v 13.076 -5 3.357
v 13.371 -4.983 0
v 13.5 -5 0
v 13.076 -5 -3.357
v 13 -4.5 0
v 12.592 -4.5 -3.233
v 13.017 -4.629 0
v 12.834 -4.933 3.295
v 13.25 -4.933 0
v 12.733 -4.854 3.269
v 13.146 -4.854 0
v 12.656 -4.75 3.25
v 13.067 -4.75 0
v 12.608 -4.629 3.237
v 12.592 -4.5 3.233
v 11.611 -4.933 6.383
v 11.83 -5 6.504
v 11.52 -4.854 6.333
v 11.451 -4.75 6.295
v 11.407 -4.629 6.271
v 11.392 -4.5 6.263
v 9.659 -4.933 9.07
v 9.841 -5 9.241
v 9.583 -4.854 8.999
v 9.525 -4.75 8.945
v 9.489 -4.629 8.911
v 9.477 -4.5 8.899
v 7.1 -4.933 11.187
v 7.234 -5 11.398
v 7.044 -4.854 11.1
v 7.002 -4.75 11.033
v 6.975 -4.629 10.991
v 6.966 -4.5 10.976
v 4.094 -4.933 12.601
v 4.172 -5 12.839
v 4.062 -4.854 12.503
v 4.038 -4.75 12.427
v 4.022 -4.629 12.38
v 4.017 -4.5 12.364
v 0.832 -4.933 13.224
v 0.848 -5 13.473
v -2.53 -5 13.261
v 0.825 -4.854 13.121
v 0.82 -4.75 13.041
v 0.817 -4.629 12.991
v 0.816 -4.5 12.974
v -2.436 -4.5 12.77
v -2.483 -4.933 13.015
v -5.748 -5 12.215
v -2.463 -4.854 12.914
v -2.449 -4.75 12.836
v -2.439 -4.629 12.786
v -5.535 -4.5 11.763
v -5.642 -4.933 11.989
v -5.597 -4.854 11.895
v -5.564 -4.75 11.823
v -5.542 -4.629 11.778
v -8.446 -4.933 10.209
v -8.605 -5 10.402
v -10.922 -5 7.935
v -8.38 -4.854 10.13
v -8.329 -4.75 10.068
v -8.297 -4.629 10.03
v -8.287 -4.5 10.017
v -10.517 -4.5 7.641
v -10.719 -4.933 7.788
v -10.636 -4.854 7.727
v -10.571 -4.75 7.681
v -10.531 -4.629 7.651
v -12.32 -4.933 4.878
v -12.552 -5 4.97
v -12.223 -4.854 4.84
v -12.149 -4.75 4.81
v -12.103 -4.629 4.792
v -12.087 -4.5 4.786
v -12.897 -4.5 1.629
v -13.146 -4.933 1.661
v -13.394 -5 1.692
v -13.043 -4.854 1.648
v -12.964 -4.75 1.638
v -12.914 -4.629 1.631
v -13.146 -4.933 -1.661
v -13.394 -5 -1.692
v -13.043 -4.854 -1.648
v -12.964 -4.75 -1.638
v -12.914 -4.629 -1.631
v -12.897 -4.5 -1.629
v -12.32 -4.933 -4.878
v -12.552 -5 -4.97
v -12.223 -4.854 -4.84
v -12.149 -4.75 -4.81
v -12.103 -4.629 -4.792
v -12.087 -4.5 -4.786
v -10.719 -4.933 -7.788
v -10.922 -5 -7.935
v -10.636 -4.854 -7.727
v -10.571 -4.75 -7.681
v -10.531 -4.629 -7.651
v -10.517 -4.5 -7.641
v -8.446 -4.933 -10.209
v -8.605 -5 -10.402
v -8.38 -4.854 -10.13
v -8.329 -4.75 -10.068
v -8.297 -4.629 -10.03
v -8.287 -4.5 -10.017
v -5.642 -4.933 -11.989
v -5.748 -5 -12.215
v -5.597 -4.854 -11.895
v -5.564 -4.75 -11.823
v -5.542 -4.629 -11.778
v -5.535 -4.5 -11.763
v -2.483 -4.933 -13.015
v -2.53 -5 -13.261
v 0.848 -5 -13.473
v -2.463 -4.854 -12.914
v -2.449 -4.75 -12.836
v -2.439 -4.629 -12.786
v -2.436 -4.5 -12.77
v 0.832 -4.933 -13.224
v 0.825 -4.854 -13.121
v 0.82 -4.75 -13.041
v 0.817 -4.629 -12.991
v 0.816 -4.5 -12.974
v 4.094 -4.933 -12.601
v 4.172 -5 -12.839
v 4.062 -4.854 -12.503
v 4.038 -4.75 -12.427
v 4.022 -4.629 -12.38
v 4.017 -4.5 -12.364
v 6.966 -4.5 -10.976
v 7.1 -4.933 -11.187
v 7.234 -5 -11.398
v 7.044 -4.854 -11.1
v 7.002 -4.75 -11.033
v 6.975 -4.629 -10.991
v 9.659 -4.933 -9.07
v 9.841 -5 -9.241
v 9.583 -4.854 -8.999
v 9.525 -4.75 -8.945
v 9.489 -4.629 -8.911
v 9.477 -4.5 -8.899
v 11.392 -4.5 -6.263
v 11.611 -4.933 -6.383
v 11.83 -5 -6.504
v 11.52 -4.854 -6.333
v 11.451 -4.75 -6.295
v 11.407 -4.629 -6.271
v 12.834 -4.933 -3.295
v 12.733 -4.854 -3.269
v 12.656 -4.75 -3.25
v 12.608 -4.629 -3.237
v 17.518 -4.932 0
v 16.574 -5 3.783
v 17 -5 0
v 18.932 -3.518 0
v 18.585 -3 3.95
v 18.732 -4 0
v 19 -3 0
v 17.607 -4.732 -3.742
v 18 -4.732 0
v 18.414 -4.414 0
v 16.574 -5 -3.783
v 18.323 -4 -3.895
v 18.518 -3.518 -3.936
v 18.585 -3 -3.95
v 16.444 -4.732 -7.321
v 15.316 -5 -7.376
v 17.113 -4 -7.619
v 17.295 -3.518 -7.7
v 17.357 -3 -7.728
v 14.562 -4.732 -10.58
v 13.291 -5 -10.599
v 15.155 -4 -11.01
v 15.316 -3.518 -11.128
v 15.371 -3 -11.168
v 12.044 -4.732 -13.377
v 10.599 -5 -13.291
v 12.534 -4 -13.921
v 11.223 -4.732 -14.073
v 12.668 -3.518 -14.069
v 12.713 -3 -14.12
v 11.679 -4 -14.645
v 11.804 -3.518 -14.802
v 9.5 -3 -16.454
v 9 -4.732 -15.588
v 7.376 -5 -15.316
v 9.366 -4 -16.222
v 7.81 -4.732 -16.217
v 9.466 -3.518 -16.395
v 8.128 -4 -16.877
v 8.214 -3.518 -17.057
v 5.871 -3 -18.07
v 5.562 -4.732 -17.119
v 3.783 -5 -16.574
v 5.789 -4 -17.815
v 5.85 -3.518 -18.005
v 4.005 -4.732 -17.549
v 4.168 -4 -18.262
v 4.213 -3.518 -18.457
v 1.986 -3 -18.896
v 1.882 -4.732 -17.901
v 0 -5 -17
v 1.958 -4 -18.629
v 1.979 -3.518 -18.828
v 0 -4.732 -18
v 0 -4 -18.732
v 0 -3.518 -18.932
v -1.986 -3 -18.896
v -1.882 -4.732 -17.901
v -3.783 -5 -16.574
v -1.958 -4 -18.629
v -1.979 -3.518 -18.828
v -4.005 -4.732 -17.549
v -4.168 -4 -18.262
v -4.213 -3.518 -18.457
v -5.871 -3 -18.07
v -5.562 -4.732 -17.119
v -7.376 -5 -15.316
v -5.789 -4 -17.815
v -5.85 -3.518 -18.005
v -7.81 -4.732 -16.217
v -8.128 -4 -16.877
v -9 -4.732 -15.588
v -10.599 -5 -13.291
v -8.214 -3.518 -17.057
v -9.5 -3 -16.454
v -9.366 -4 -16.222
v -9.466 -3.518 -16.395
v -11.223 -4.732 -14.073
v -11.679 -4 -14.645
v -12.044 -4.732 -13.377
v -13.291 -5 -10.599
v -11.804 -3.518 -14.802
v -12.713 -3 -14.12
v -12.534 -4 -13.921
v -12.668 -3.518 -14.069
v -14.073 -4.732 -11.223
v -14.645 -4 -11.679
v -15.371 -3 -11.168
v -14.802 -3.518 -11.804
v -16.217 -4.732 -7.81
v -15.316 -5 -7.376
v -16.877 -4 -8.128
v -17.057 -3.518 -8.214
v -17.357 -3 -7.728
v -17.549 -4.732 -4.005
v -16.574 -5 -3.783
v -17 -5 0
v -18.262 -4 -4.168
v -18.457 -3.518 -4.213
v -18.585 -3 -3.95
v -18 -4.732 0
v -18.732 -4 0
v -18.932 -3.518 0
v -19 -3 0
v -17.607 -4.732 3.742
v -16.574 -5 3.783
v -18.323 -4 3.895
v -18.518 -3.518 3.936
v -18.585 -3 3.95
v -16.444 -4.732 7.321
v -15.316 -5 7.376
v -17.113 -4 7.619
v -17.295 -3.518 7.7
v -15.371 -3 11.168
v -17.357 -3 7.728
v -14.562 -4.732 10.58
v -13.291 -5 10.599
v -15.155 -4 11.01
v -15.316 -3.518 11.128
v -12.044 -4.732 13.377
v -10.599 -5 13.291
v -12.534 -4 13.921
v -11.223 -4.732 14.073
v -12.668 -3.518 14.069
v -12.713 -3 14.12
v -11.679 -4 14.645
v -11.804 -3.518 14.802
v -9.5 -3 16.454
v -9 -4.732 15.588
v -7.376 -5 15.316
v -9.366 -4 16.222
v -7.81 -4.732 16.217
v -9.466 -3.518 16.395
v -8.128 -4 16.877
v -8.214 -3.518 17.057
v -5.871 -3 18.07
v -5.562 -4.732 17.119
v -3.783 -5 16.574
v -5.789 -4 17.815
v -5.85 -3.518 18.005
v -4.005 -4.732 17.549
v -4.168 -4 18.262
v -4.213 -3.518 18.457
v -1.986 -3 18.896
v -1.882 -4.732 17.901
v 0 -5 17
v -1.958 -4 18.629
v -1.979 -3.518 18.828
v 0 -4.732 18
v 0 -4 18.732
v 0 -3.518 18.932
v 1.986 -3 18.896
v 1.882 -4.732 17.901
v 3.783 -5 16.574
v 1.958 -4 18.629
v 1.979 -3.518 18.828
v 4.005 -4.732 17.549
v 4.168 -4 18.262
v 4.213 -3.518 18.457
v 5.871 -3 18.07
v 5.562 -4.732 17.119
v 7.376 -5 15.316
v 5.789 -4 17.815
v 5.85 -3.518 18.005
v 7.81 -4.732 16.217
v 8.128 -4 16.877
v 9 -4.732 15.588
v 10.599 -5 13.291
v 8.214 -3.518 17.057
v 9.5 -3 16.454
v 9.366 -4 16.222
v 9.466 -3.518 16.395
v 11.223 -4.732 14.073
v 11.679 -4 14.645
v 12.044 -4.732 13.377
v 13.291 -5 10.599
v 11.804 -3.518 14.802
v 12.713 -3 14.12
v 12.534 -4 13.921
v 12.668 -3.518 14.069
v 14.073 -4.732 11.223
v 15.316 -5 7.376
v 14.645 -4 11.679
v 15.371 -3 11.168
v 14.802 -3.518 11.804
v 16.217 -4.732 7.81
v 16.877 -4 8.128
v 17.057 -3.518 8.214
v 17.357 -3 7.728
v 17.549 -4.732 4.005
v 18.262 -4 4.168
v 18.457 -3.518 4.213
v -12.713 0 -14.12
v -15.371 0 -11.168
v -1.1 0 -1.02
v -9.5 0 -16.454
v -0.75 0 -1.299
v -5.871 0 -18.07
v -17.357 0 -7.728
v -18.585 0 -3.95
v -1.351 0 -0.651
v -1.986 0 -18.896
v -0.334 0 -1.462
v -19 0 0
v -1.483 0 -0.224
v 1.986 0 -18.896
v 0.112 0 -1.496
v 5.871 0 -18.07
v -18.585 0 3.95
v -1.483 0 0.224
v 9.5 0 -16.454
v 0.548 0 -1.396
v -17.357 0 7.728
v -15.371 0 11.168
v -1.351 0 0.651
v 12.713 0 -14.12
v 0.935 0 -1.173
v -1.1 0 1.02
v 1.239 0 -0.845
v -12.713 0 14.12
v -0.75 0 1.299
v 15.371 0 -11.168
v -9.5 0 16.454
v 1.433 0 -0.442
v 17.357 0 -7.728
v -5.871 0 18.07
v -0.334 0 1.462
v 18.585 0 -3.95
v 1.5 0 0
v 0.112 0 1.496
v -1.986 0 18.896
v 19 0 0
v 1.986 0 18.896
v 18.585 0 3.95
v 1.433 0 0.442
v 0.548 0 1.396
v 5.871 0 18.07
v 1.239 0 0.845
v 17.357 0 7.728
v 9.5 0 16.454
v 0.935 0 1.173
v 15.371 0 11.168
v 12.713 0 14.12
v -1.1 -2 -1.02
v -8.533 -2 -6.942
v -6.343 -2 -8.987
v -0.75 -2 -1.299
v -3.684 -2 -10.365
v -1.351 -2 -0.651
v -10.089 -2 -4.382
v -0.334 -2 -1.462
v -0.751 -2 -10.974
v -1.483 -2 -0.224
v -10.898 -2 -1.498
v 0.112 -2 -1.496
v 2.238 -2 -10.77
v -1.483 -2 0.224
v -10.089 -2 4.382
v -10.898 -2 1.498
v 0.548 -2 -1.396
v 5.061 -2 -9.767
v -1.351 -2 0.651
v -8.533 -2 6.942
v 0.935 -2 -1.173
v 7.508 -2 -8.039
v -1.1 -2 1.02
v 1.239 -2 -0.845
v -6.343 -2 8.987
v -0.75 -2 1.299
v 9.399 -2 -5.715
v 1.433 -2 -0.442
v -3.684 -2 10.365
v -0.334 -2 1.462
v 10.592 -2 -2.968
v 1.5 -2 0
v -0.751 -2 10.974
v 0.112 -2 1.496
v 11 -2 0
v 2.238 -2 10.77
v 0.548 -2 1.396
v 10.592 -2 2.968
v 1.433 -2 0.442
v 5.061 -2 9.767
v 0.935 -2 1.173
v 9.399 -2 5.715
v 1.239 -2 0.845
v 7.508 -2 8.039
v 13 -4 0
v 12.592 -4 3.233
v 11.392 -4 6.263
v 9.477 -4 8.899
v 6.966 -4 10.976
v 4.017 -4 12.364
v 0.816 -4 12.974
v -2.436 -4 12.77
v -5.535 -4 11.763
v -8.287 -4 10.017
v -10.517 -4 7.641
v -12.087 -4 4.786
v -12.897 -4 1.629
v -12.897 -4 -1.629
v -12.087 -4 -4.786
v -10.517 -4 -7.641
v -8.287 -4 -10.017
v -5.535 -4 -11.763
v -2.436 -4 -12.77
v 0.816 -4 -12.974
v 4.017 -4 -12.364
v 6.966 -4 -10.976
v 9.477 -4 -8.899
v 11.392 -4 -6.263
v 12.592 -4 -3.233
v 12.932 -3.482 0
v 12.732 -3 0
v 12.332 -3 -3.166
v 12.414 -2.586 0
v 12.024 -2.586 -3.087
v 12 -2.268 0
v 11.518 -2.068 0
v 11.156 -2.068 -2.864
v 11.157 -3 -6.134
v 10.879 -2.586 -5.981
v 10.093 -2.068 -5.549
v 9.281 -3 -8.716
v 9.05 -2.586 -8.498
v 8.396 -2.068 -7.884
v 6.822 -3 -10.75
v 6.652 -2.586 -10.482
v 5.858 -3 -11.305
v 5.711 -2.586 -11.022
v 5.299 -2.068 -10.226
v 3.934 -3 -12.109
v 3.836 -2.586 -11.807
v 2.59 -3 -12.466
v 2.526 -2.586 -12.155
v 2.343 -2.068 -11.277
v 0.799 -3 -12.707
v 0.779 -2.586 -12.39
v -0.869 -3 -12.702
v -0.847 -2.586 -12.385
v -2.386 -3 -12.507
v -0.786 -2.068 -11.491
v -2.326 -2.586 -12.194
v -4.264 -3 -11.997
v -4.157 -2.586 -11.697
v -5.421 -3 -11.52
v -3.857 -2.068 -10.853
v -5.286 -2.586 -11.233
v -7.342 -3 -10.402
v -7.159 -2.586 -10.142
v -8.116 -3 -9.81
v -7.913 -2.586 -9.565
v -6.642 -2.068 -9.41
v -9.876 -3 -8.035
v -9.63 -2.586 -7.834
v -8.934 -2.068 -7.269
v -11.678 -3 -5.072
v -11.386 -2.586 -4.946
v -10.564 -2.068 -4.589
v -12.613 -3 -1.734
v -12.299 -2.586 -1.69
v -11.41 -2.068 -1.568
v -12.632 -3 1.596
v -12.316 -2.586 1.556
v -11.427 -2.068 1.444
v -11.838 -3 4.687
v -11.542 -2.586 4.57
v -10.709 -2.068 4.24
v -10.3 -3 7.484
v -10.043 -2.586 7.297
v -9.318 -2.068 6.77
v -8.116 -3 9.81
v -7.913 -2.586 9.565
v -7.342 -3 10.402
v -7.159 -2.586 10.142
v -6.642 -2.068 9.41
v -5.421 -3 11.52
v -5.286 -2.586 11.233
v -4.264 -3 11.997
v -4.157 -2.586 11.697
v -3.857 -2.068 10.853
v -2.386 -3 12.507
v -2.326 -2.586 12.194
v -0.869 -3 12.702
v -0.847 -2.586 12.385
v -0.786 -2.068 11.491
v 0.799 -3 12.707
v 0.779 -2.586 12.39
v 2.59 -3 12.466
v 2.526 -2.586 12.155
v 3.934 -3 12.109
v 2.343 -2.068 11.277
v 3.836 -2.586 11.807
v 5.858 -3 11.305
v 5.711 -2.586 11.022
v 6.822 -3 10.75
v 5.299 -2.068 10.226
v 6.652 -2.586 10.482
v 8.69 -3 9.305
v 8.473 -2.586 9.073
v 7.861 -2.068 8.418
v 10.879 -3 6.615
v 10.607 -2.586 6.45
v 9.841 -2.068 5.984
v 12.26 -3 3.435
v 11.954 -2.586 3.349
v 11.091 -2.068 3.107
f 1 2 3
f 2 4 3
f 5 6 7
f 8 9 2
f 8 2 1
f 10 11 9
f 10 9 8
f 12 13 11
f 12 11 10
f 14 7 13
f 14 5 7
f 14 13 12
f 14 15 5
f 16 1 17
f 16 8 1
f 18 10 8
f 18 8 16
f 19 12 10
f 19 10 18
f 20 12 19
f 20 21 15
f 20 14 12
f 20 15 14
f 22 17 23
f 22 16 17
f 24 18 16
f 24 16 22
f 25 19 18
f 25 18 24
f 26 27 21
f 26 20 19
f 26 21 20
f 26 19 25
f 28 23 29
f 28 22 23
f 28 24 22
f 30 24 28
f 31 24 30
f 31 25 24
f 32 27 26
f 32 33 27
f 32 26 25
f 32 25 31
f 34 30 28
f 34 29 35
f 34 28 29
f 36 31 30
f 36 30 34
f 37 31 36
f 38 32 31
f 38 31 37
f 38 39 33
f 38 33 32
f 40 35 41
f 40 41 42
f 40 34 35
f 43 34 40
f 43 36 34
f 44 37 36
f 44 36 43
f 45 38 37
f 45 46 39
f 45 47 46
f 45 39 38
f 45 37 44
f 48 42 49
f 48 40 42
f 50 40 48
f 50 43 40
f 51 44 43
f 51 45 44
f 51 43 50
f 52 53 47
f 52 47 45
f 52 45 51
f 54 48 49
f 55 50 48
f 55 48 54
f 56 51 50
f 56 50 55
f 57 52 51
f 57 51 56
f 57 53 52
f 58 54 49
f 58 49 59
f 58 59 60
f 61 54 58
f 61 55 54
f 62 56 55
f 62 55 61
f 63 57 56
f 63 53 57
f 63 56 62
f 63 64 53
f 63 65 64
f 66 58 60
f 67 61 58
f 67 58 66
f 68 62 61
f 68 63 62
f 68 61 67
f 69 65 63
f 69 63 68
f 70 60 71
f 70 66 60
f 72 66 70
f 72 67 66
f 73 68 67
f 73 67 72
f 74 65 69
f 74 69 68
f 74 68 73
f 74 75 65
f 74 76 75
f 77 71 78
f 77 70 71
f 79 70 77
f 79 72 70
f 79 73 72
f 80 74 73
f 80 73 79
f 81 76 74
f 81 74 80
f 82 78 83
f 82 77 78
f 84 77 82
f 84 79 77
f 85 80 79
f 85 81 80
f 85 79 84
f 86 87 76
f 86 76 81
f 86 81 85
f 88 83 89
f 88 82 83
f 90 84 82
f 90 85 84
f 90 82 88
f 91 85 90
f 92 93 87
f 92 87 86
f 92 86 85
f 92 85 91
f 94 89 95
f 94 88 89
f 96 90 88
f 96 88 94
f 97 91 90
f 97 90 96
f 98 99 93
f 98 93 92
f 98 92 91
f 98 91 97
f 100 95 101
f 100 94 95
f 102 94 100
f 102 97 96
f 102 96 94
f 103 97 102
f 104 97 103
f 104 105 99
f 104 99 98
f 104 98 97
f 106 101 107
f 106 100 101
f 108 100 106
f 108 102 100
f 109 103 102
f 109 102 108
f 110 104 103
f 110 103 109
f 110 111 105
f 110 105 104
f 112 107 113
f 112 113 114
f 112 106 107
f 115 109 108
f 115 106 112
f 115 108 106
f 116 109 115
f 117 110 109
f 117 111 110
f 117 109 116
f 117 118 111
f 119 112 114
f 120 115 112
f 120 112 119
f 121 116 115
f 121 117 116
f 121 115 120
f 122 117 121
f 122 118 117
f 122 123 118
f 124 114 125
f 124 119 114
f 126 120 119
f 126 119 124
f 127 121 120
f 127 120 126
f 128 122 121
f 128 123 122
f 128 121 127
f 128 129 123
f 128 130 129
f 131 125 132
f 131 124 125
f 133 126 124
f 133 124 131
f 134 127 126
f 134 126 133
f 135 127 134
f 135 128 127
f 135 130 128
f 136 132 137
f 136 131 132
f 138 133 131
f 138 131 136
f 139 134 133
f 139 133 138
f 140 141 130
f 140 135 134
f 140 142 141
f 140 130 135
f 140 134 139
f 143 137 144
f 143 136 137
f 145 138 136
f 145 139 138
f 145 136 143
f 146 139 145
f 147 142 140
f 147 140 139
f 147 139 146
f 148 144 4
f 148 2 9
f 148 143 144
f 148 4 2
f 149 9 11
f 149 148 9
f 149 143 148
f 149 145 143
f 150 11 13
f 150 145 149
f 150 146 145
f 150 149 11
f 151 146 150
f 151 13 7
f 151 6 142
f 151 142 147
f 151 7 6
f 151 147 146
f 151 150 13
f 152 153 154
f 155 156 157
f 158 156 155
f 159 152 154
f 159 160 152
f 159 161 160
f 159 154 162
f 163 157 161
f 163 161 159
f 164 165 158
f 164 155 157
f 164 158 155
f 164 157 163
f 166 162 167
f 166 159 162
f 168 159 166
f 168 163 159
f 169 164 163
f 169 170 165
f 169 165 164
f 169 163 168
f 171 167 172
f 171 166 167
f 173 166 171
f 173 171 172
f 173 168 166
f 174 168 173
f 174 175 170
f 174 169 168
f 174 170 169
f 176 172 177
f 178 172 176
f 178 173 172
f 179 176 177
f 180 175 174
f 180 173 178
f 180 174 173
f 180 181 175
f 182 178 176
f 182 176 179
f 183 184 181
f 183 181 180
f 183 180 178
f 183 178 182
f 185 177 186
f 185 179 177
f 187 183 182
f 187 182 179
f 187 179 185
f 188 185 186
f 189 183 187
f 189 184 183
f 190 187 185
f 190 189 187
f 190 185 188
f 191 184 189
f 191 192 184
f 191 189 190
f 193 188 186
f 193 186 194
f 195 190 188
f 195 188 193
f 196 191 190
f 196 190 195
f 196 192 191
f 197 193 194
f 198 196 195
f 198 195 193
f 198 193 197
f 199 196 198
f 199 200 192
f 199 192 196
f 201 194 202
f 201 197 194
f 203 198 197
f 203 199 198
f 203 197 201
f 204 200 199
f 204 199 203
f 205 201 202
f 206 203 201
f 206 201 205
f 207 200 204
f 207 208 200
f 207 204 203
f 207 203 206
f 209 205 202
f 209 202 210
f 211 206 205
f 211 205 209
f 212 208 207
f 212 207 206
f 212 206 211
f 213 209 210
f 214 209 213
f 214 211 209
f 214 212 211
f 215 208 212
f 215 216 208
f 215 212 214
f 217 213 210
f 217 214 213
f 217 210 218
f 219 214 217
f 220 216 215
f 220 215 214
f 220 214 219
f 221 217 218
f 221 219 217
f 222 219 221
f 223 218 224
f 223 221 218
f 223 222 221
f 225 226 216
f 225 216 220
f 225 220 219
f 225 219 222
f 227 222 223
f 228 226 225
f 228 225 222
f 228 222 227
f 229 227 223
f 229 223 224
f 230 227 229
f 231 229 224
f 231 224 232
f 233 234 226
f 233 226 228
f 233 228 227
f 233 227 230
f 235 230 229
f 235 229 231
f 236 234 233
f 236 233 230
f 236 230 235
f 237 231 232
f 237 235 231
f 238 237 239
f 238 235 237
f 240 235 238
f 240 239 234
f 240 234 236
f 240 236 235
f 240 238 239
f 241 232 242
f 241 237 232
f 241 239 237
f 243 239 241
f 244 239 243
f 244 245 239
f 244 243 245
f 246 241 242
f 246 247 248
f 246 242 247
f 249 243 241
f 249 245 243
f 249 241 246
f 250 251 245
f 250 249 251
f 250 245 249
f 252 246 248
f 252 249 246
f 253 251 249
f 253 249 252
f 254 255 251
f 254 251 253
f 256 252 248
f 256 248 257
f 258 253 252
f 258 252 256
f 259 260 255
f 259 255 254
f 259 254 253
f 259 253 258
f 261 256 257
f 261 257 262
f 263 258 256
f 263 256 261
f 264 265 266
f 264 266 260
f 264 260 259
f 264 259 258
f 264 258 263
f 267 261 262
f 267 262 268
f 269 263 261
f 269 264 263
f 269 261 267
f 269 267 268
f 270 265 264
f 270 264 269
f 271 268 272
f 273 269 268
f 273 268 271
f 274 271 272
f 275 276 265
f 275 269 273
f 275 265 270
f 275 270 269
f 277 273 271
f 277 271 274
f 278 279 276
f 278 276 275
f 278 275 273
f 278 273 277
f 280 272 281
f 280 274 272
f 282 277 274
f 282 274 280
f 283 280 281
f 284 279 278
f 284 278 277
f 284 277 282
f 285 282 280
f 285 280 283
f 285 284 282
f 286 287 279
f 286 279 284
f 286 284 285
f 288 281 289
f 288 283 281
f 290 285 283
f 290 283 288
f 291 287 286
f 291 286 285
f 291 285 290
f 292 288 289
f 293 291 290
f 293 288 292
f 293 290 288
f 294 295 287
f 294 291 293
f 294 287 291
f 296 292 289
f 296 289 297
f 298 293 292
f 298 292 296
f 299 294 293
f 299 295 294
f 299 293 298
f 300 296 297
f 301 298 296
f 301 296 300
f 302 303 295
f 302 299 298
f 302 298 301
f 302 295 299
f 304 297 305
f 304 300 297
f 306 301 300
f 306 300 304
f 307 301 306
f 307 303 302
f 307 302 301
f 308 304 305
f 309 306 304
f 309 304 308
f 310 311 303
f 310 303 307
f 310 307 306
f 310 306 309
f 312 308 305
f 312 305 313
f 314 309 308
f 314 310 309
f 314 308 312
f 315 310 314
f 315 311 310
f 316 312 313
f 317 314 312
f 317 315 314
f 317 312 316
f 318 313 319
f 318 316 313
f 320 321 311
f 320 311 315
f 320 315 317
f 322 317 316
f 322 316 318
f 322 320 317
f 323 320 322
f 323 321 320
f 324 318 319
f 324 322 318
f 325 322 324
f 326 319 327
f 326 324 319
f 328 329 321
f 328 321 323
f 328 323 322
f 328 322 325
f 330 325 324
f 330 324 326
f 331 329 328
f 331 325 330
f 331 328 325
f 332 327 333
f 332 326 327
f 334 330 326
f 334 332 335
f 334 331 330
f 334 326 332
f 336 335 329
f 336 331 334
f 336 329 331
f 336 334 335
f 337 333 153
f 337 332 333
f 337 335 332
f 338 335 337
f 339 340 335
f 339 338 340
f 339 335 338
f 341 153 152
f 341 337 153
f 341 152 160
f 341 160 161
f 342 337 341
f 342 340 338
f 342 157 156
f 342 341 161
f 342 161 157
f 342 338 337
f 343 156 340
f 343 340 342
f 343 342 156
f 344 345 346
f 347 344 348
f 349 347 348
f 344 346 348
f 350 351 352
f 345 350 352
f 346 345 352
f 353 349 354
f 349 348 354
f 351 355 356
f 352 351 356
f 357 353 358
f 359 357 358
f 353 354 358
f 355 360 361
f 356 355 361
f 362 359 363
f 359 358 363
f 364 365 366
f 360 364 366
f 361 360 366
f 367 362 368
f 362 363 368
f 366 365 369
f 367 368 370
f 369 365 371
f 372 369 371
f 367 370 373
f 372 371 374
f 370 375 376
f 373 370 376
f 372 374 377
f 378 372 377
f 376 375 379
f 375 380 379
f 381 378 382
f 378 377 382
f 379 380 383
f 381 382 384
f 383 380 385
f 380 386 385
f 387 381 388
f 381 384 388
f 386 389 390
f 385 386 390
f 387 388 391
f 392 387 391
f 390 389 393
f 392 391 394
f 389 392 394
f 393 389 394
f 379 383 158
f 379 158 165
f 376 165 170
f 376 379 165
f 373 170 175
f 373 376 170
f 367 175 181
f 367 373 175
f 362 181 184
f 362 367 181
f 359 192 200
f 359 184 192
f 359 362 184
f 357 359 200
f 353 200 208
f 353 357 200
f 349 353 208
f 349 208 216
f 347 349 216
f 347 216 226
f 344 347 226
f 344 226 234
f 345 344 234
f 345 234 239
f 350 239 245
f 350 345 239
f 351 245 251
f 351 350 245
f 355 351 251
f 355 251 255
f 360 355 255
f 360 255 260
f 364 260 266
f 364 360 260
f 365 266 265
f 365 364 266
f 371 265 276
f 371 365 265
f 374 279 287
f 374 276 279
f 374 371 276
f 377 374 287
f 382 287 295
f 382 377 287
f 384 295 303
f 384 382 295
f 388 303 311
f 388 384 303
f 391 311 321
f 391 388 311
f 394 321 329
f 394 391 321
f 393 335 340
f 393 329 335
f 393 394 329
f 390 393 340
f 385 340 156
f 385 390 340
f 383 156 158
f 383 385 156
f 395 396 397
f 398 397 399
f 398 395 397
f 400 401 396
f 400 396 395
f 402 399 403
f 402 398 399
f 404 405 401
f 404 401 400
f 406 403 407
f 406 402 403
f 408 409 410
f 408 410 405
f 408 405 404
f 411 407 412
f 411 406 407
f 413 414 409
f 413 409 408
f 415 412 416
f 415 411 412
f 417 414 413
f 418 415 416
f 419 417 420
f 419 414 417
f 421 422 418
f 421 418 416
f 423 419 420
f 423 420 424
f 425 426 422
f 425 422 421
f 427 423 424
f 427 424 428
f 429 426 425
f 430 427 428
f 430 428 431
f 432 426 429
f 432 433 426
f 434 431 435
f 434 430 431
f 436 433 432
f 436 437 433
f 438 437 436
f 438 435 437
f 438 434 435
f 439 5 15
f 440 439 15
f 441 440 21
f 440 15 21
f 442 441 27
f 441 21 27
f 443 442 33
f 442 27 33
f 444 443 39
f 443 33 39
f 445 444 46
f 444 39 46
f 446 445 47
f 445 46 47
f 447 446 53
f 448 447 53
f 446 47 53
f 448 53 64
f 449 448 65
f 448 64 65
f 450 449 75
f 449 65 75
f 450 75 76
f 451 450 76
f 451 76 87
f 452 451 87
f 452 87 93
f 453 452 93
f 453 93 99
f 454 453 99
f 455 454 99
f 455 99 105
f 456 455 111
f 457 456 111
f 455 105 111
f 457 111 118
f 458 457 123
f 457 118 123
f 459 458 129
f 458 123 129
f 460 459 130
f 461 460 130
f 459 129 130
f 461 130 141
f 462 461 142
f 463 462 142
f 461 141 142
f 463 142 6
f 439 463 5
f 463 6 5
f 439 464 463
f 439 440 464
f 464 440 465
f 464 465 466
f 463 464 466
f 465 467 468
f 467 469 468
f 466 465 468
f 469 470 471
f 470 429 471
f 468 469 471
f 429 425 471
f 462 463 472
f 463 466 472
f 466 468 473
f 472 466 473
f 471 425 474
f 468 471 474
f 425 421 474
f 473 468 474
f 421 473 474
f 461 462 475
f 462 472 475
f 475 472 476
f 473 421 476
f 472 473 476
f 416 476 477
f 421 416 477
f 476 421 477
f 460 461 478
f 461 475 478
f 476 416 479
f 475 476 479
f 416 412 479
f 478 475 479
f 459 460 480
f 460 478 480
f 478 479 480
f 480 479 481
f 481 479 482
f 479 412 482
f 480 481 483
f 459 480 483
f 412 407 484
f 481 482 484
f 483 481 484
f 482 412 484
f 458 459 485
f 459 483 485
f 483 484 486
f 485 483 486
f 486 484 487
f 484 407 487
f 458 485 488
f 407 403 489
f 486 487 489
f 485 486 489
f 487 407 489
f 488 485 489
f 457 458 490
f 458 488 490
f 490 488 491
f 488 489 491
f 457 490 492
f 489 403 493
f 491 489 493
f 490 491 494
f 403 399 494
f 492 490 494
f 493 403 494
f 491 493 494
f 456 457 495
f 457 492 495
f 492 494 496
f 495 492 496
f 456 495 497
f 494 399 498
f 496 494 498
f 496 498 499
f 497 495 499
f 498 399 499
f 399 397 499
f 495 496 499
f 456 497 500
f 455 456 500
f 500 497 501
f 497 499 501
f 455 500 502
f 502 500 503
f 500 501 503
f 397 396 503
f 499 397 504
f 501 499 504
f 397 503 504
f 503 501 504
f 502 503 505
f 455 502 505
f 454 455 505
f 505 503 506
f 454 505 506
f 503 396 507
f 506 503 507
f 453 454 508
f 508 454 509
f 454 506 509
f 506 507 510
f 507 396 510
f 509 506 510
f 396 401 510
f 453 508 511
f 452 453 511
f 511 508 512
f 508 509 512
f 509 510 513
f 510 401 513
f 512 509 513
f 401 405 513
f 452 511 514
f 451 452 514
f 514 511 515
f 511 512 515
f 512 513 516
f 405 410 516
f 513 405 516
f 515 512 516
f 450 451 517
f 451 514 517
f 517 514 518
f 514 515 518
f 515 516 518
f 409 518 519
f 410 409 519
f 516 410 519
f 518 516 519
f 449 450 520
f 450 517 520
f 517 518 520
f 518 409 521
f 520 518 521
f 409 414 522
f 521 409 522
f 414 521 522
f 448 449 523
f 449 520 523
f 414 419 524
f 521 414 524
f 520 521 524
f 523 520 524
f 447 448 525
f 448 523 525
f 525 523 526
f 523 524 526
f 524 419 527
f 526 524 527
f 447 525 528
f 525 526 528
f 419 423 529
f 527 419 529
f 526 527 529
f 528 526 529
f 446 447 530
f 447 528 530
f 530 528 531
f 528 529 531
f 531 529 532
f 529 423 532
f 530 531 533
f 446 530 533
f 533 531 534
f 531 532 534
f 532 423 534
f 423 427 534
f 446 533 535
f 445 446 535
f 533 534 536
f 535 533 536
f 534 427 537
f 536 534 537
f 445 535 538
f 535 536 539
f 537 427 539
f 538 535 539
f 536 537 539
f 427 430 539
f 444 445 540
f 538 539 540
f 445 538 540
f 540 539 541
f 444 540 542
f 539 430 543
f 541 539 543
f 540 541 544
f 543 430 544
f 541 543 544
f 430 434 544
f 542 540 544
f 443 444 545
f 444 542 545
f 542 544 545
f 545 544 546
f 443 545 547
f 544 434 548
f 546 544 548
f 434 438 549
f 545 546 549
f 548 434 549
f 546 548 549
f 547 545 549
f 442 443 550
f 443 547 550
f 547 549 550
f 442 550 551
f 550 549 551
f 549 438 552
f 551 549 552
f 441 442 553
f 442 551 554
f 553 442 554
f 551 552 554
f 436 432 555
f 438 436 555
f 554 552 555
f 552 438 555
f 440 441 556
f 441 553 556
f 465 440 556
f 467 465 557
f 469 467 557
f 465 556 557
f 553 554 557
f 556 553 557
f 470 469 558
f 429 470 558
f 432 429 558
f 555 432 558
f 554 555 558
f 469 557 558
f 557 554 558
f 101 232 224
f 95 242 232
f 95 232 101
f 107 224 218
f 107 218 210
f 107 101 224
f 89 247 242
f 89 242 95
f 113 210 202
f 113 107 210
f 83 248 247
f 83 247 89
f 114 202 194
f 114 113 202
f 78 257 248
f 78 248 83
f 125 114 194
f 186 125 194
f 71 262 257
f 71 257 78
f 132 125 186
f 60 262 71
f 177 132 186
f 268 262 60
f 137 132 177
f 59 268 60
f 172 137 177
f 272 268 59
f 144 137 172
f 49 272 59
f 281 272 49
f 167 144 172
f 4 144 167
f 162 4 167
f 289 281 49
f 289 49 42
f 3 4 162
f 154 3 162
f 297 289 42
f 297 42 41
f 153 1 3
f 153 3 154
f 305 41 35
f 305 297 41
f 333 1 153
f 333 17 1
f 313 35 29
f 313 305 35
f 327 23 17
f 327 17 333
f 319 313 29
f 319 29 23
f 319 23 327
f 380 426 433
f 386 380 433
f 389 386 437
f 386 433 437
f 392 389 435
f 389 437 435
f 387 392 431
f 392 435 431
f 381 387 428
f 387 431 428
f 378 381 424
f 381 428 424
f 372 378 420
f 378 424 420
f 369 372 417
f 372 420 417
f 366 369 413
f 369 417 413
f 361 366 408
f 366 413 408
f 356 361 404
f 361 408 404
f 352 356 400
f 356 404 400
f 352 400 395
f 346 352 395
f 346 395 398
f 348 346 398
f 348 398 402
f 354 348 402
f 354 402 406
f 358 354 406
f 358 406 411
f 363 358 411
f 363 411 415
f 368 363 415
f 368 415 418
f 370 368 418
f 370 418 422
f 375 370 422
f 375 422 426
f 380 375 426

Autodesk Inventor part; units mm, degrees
ref_plane "YZ Plane" through (0, 0, 0) normal (1, 0, 0) x (0, 1, 0)
ref_plane "XZ Plane" through (0, 0, 0) normal (0, 1, 0) x (-1, 0, 0)
ref_plane "XY Plane" through (0, 0, 0) normal (0, 0, 1) x (1, 0, 0)
sketch "Sketch1" plane through (0, 0, 0) normal (0, 0, 1) x (1, 0, 0)
  line L0 (0, 0) -> (19, 0)
  line L1 (0, 0) -> (0, -2)
  line L2 (0, -2) -> (13, -2)
  line L3 (13, -2) -> (13, -5)
  line L4 (13, -5) -> (17, -5)
  line L5 (19, -3) -> (19, 0)
  line L6 (1.5, 0) -> (1.5, -2)
  arc A0 (17, -5) -> (19, -3) centre (17, -3) ccw
  point P0 (19, -5)
  dimension "d5" = 19
  dimension "d12" = 2
  dimension "d16" = 5
  dimension "d17" = 1.5
  dimension "d23" = 2
  dimension "d24" = 90
  dimension "d25" = 4
revolve "Revolution1" add sketch "Sketch1" angle 360 about axis through (0, 0, 0) along (0, -1, 0) contours L0 L5 A0 L4 L3 L2 L6
fillet "Fillet2" radius 0.5 1 edges at (-13, -5, 0)
fillet "Fillet3" radius 2 1 edges at (-13, -2, 0)
properties part number "Seal_M_TPU"
